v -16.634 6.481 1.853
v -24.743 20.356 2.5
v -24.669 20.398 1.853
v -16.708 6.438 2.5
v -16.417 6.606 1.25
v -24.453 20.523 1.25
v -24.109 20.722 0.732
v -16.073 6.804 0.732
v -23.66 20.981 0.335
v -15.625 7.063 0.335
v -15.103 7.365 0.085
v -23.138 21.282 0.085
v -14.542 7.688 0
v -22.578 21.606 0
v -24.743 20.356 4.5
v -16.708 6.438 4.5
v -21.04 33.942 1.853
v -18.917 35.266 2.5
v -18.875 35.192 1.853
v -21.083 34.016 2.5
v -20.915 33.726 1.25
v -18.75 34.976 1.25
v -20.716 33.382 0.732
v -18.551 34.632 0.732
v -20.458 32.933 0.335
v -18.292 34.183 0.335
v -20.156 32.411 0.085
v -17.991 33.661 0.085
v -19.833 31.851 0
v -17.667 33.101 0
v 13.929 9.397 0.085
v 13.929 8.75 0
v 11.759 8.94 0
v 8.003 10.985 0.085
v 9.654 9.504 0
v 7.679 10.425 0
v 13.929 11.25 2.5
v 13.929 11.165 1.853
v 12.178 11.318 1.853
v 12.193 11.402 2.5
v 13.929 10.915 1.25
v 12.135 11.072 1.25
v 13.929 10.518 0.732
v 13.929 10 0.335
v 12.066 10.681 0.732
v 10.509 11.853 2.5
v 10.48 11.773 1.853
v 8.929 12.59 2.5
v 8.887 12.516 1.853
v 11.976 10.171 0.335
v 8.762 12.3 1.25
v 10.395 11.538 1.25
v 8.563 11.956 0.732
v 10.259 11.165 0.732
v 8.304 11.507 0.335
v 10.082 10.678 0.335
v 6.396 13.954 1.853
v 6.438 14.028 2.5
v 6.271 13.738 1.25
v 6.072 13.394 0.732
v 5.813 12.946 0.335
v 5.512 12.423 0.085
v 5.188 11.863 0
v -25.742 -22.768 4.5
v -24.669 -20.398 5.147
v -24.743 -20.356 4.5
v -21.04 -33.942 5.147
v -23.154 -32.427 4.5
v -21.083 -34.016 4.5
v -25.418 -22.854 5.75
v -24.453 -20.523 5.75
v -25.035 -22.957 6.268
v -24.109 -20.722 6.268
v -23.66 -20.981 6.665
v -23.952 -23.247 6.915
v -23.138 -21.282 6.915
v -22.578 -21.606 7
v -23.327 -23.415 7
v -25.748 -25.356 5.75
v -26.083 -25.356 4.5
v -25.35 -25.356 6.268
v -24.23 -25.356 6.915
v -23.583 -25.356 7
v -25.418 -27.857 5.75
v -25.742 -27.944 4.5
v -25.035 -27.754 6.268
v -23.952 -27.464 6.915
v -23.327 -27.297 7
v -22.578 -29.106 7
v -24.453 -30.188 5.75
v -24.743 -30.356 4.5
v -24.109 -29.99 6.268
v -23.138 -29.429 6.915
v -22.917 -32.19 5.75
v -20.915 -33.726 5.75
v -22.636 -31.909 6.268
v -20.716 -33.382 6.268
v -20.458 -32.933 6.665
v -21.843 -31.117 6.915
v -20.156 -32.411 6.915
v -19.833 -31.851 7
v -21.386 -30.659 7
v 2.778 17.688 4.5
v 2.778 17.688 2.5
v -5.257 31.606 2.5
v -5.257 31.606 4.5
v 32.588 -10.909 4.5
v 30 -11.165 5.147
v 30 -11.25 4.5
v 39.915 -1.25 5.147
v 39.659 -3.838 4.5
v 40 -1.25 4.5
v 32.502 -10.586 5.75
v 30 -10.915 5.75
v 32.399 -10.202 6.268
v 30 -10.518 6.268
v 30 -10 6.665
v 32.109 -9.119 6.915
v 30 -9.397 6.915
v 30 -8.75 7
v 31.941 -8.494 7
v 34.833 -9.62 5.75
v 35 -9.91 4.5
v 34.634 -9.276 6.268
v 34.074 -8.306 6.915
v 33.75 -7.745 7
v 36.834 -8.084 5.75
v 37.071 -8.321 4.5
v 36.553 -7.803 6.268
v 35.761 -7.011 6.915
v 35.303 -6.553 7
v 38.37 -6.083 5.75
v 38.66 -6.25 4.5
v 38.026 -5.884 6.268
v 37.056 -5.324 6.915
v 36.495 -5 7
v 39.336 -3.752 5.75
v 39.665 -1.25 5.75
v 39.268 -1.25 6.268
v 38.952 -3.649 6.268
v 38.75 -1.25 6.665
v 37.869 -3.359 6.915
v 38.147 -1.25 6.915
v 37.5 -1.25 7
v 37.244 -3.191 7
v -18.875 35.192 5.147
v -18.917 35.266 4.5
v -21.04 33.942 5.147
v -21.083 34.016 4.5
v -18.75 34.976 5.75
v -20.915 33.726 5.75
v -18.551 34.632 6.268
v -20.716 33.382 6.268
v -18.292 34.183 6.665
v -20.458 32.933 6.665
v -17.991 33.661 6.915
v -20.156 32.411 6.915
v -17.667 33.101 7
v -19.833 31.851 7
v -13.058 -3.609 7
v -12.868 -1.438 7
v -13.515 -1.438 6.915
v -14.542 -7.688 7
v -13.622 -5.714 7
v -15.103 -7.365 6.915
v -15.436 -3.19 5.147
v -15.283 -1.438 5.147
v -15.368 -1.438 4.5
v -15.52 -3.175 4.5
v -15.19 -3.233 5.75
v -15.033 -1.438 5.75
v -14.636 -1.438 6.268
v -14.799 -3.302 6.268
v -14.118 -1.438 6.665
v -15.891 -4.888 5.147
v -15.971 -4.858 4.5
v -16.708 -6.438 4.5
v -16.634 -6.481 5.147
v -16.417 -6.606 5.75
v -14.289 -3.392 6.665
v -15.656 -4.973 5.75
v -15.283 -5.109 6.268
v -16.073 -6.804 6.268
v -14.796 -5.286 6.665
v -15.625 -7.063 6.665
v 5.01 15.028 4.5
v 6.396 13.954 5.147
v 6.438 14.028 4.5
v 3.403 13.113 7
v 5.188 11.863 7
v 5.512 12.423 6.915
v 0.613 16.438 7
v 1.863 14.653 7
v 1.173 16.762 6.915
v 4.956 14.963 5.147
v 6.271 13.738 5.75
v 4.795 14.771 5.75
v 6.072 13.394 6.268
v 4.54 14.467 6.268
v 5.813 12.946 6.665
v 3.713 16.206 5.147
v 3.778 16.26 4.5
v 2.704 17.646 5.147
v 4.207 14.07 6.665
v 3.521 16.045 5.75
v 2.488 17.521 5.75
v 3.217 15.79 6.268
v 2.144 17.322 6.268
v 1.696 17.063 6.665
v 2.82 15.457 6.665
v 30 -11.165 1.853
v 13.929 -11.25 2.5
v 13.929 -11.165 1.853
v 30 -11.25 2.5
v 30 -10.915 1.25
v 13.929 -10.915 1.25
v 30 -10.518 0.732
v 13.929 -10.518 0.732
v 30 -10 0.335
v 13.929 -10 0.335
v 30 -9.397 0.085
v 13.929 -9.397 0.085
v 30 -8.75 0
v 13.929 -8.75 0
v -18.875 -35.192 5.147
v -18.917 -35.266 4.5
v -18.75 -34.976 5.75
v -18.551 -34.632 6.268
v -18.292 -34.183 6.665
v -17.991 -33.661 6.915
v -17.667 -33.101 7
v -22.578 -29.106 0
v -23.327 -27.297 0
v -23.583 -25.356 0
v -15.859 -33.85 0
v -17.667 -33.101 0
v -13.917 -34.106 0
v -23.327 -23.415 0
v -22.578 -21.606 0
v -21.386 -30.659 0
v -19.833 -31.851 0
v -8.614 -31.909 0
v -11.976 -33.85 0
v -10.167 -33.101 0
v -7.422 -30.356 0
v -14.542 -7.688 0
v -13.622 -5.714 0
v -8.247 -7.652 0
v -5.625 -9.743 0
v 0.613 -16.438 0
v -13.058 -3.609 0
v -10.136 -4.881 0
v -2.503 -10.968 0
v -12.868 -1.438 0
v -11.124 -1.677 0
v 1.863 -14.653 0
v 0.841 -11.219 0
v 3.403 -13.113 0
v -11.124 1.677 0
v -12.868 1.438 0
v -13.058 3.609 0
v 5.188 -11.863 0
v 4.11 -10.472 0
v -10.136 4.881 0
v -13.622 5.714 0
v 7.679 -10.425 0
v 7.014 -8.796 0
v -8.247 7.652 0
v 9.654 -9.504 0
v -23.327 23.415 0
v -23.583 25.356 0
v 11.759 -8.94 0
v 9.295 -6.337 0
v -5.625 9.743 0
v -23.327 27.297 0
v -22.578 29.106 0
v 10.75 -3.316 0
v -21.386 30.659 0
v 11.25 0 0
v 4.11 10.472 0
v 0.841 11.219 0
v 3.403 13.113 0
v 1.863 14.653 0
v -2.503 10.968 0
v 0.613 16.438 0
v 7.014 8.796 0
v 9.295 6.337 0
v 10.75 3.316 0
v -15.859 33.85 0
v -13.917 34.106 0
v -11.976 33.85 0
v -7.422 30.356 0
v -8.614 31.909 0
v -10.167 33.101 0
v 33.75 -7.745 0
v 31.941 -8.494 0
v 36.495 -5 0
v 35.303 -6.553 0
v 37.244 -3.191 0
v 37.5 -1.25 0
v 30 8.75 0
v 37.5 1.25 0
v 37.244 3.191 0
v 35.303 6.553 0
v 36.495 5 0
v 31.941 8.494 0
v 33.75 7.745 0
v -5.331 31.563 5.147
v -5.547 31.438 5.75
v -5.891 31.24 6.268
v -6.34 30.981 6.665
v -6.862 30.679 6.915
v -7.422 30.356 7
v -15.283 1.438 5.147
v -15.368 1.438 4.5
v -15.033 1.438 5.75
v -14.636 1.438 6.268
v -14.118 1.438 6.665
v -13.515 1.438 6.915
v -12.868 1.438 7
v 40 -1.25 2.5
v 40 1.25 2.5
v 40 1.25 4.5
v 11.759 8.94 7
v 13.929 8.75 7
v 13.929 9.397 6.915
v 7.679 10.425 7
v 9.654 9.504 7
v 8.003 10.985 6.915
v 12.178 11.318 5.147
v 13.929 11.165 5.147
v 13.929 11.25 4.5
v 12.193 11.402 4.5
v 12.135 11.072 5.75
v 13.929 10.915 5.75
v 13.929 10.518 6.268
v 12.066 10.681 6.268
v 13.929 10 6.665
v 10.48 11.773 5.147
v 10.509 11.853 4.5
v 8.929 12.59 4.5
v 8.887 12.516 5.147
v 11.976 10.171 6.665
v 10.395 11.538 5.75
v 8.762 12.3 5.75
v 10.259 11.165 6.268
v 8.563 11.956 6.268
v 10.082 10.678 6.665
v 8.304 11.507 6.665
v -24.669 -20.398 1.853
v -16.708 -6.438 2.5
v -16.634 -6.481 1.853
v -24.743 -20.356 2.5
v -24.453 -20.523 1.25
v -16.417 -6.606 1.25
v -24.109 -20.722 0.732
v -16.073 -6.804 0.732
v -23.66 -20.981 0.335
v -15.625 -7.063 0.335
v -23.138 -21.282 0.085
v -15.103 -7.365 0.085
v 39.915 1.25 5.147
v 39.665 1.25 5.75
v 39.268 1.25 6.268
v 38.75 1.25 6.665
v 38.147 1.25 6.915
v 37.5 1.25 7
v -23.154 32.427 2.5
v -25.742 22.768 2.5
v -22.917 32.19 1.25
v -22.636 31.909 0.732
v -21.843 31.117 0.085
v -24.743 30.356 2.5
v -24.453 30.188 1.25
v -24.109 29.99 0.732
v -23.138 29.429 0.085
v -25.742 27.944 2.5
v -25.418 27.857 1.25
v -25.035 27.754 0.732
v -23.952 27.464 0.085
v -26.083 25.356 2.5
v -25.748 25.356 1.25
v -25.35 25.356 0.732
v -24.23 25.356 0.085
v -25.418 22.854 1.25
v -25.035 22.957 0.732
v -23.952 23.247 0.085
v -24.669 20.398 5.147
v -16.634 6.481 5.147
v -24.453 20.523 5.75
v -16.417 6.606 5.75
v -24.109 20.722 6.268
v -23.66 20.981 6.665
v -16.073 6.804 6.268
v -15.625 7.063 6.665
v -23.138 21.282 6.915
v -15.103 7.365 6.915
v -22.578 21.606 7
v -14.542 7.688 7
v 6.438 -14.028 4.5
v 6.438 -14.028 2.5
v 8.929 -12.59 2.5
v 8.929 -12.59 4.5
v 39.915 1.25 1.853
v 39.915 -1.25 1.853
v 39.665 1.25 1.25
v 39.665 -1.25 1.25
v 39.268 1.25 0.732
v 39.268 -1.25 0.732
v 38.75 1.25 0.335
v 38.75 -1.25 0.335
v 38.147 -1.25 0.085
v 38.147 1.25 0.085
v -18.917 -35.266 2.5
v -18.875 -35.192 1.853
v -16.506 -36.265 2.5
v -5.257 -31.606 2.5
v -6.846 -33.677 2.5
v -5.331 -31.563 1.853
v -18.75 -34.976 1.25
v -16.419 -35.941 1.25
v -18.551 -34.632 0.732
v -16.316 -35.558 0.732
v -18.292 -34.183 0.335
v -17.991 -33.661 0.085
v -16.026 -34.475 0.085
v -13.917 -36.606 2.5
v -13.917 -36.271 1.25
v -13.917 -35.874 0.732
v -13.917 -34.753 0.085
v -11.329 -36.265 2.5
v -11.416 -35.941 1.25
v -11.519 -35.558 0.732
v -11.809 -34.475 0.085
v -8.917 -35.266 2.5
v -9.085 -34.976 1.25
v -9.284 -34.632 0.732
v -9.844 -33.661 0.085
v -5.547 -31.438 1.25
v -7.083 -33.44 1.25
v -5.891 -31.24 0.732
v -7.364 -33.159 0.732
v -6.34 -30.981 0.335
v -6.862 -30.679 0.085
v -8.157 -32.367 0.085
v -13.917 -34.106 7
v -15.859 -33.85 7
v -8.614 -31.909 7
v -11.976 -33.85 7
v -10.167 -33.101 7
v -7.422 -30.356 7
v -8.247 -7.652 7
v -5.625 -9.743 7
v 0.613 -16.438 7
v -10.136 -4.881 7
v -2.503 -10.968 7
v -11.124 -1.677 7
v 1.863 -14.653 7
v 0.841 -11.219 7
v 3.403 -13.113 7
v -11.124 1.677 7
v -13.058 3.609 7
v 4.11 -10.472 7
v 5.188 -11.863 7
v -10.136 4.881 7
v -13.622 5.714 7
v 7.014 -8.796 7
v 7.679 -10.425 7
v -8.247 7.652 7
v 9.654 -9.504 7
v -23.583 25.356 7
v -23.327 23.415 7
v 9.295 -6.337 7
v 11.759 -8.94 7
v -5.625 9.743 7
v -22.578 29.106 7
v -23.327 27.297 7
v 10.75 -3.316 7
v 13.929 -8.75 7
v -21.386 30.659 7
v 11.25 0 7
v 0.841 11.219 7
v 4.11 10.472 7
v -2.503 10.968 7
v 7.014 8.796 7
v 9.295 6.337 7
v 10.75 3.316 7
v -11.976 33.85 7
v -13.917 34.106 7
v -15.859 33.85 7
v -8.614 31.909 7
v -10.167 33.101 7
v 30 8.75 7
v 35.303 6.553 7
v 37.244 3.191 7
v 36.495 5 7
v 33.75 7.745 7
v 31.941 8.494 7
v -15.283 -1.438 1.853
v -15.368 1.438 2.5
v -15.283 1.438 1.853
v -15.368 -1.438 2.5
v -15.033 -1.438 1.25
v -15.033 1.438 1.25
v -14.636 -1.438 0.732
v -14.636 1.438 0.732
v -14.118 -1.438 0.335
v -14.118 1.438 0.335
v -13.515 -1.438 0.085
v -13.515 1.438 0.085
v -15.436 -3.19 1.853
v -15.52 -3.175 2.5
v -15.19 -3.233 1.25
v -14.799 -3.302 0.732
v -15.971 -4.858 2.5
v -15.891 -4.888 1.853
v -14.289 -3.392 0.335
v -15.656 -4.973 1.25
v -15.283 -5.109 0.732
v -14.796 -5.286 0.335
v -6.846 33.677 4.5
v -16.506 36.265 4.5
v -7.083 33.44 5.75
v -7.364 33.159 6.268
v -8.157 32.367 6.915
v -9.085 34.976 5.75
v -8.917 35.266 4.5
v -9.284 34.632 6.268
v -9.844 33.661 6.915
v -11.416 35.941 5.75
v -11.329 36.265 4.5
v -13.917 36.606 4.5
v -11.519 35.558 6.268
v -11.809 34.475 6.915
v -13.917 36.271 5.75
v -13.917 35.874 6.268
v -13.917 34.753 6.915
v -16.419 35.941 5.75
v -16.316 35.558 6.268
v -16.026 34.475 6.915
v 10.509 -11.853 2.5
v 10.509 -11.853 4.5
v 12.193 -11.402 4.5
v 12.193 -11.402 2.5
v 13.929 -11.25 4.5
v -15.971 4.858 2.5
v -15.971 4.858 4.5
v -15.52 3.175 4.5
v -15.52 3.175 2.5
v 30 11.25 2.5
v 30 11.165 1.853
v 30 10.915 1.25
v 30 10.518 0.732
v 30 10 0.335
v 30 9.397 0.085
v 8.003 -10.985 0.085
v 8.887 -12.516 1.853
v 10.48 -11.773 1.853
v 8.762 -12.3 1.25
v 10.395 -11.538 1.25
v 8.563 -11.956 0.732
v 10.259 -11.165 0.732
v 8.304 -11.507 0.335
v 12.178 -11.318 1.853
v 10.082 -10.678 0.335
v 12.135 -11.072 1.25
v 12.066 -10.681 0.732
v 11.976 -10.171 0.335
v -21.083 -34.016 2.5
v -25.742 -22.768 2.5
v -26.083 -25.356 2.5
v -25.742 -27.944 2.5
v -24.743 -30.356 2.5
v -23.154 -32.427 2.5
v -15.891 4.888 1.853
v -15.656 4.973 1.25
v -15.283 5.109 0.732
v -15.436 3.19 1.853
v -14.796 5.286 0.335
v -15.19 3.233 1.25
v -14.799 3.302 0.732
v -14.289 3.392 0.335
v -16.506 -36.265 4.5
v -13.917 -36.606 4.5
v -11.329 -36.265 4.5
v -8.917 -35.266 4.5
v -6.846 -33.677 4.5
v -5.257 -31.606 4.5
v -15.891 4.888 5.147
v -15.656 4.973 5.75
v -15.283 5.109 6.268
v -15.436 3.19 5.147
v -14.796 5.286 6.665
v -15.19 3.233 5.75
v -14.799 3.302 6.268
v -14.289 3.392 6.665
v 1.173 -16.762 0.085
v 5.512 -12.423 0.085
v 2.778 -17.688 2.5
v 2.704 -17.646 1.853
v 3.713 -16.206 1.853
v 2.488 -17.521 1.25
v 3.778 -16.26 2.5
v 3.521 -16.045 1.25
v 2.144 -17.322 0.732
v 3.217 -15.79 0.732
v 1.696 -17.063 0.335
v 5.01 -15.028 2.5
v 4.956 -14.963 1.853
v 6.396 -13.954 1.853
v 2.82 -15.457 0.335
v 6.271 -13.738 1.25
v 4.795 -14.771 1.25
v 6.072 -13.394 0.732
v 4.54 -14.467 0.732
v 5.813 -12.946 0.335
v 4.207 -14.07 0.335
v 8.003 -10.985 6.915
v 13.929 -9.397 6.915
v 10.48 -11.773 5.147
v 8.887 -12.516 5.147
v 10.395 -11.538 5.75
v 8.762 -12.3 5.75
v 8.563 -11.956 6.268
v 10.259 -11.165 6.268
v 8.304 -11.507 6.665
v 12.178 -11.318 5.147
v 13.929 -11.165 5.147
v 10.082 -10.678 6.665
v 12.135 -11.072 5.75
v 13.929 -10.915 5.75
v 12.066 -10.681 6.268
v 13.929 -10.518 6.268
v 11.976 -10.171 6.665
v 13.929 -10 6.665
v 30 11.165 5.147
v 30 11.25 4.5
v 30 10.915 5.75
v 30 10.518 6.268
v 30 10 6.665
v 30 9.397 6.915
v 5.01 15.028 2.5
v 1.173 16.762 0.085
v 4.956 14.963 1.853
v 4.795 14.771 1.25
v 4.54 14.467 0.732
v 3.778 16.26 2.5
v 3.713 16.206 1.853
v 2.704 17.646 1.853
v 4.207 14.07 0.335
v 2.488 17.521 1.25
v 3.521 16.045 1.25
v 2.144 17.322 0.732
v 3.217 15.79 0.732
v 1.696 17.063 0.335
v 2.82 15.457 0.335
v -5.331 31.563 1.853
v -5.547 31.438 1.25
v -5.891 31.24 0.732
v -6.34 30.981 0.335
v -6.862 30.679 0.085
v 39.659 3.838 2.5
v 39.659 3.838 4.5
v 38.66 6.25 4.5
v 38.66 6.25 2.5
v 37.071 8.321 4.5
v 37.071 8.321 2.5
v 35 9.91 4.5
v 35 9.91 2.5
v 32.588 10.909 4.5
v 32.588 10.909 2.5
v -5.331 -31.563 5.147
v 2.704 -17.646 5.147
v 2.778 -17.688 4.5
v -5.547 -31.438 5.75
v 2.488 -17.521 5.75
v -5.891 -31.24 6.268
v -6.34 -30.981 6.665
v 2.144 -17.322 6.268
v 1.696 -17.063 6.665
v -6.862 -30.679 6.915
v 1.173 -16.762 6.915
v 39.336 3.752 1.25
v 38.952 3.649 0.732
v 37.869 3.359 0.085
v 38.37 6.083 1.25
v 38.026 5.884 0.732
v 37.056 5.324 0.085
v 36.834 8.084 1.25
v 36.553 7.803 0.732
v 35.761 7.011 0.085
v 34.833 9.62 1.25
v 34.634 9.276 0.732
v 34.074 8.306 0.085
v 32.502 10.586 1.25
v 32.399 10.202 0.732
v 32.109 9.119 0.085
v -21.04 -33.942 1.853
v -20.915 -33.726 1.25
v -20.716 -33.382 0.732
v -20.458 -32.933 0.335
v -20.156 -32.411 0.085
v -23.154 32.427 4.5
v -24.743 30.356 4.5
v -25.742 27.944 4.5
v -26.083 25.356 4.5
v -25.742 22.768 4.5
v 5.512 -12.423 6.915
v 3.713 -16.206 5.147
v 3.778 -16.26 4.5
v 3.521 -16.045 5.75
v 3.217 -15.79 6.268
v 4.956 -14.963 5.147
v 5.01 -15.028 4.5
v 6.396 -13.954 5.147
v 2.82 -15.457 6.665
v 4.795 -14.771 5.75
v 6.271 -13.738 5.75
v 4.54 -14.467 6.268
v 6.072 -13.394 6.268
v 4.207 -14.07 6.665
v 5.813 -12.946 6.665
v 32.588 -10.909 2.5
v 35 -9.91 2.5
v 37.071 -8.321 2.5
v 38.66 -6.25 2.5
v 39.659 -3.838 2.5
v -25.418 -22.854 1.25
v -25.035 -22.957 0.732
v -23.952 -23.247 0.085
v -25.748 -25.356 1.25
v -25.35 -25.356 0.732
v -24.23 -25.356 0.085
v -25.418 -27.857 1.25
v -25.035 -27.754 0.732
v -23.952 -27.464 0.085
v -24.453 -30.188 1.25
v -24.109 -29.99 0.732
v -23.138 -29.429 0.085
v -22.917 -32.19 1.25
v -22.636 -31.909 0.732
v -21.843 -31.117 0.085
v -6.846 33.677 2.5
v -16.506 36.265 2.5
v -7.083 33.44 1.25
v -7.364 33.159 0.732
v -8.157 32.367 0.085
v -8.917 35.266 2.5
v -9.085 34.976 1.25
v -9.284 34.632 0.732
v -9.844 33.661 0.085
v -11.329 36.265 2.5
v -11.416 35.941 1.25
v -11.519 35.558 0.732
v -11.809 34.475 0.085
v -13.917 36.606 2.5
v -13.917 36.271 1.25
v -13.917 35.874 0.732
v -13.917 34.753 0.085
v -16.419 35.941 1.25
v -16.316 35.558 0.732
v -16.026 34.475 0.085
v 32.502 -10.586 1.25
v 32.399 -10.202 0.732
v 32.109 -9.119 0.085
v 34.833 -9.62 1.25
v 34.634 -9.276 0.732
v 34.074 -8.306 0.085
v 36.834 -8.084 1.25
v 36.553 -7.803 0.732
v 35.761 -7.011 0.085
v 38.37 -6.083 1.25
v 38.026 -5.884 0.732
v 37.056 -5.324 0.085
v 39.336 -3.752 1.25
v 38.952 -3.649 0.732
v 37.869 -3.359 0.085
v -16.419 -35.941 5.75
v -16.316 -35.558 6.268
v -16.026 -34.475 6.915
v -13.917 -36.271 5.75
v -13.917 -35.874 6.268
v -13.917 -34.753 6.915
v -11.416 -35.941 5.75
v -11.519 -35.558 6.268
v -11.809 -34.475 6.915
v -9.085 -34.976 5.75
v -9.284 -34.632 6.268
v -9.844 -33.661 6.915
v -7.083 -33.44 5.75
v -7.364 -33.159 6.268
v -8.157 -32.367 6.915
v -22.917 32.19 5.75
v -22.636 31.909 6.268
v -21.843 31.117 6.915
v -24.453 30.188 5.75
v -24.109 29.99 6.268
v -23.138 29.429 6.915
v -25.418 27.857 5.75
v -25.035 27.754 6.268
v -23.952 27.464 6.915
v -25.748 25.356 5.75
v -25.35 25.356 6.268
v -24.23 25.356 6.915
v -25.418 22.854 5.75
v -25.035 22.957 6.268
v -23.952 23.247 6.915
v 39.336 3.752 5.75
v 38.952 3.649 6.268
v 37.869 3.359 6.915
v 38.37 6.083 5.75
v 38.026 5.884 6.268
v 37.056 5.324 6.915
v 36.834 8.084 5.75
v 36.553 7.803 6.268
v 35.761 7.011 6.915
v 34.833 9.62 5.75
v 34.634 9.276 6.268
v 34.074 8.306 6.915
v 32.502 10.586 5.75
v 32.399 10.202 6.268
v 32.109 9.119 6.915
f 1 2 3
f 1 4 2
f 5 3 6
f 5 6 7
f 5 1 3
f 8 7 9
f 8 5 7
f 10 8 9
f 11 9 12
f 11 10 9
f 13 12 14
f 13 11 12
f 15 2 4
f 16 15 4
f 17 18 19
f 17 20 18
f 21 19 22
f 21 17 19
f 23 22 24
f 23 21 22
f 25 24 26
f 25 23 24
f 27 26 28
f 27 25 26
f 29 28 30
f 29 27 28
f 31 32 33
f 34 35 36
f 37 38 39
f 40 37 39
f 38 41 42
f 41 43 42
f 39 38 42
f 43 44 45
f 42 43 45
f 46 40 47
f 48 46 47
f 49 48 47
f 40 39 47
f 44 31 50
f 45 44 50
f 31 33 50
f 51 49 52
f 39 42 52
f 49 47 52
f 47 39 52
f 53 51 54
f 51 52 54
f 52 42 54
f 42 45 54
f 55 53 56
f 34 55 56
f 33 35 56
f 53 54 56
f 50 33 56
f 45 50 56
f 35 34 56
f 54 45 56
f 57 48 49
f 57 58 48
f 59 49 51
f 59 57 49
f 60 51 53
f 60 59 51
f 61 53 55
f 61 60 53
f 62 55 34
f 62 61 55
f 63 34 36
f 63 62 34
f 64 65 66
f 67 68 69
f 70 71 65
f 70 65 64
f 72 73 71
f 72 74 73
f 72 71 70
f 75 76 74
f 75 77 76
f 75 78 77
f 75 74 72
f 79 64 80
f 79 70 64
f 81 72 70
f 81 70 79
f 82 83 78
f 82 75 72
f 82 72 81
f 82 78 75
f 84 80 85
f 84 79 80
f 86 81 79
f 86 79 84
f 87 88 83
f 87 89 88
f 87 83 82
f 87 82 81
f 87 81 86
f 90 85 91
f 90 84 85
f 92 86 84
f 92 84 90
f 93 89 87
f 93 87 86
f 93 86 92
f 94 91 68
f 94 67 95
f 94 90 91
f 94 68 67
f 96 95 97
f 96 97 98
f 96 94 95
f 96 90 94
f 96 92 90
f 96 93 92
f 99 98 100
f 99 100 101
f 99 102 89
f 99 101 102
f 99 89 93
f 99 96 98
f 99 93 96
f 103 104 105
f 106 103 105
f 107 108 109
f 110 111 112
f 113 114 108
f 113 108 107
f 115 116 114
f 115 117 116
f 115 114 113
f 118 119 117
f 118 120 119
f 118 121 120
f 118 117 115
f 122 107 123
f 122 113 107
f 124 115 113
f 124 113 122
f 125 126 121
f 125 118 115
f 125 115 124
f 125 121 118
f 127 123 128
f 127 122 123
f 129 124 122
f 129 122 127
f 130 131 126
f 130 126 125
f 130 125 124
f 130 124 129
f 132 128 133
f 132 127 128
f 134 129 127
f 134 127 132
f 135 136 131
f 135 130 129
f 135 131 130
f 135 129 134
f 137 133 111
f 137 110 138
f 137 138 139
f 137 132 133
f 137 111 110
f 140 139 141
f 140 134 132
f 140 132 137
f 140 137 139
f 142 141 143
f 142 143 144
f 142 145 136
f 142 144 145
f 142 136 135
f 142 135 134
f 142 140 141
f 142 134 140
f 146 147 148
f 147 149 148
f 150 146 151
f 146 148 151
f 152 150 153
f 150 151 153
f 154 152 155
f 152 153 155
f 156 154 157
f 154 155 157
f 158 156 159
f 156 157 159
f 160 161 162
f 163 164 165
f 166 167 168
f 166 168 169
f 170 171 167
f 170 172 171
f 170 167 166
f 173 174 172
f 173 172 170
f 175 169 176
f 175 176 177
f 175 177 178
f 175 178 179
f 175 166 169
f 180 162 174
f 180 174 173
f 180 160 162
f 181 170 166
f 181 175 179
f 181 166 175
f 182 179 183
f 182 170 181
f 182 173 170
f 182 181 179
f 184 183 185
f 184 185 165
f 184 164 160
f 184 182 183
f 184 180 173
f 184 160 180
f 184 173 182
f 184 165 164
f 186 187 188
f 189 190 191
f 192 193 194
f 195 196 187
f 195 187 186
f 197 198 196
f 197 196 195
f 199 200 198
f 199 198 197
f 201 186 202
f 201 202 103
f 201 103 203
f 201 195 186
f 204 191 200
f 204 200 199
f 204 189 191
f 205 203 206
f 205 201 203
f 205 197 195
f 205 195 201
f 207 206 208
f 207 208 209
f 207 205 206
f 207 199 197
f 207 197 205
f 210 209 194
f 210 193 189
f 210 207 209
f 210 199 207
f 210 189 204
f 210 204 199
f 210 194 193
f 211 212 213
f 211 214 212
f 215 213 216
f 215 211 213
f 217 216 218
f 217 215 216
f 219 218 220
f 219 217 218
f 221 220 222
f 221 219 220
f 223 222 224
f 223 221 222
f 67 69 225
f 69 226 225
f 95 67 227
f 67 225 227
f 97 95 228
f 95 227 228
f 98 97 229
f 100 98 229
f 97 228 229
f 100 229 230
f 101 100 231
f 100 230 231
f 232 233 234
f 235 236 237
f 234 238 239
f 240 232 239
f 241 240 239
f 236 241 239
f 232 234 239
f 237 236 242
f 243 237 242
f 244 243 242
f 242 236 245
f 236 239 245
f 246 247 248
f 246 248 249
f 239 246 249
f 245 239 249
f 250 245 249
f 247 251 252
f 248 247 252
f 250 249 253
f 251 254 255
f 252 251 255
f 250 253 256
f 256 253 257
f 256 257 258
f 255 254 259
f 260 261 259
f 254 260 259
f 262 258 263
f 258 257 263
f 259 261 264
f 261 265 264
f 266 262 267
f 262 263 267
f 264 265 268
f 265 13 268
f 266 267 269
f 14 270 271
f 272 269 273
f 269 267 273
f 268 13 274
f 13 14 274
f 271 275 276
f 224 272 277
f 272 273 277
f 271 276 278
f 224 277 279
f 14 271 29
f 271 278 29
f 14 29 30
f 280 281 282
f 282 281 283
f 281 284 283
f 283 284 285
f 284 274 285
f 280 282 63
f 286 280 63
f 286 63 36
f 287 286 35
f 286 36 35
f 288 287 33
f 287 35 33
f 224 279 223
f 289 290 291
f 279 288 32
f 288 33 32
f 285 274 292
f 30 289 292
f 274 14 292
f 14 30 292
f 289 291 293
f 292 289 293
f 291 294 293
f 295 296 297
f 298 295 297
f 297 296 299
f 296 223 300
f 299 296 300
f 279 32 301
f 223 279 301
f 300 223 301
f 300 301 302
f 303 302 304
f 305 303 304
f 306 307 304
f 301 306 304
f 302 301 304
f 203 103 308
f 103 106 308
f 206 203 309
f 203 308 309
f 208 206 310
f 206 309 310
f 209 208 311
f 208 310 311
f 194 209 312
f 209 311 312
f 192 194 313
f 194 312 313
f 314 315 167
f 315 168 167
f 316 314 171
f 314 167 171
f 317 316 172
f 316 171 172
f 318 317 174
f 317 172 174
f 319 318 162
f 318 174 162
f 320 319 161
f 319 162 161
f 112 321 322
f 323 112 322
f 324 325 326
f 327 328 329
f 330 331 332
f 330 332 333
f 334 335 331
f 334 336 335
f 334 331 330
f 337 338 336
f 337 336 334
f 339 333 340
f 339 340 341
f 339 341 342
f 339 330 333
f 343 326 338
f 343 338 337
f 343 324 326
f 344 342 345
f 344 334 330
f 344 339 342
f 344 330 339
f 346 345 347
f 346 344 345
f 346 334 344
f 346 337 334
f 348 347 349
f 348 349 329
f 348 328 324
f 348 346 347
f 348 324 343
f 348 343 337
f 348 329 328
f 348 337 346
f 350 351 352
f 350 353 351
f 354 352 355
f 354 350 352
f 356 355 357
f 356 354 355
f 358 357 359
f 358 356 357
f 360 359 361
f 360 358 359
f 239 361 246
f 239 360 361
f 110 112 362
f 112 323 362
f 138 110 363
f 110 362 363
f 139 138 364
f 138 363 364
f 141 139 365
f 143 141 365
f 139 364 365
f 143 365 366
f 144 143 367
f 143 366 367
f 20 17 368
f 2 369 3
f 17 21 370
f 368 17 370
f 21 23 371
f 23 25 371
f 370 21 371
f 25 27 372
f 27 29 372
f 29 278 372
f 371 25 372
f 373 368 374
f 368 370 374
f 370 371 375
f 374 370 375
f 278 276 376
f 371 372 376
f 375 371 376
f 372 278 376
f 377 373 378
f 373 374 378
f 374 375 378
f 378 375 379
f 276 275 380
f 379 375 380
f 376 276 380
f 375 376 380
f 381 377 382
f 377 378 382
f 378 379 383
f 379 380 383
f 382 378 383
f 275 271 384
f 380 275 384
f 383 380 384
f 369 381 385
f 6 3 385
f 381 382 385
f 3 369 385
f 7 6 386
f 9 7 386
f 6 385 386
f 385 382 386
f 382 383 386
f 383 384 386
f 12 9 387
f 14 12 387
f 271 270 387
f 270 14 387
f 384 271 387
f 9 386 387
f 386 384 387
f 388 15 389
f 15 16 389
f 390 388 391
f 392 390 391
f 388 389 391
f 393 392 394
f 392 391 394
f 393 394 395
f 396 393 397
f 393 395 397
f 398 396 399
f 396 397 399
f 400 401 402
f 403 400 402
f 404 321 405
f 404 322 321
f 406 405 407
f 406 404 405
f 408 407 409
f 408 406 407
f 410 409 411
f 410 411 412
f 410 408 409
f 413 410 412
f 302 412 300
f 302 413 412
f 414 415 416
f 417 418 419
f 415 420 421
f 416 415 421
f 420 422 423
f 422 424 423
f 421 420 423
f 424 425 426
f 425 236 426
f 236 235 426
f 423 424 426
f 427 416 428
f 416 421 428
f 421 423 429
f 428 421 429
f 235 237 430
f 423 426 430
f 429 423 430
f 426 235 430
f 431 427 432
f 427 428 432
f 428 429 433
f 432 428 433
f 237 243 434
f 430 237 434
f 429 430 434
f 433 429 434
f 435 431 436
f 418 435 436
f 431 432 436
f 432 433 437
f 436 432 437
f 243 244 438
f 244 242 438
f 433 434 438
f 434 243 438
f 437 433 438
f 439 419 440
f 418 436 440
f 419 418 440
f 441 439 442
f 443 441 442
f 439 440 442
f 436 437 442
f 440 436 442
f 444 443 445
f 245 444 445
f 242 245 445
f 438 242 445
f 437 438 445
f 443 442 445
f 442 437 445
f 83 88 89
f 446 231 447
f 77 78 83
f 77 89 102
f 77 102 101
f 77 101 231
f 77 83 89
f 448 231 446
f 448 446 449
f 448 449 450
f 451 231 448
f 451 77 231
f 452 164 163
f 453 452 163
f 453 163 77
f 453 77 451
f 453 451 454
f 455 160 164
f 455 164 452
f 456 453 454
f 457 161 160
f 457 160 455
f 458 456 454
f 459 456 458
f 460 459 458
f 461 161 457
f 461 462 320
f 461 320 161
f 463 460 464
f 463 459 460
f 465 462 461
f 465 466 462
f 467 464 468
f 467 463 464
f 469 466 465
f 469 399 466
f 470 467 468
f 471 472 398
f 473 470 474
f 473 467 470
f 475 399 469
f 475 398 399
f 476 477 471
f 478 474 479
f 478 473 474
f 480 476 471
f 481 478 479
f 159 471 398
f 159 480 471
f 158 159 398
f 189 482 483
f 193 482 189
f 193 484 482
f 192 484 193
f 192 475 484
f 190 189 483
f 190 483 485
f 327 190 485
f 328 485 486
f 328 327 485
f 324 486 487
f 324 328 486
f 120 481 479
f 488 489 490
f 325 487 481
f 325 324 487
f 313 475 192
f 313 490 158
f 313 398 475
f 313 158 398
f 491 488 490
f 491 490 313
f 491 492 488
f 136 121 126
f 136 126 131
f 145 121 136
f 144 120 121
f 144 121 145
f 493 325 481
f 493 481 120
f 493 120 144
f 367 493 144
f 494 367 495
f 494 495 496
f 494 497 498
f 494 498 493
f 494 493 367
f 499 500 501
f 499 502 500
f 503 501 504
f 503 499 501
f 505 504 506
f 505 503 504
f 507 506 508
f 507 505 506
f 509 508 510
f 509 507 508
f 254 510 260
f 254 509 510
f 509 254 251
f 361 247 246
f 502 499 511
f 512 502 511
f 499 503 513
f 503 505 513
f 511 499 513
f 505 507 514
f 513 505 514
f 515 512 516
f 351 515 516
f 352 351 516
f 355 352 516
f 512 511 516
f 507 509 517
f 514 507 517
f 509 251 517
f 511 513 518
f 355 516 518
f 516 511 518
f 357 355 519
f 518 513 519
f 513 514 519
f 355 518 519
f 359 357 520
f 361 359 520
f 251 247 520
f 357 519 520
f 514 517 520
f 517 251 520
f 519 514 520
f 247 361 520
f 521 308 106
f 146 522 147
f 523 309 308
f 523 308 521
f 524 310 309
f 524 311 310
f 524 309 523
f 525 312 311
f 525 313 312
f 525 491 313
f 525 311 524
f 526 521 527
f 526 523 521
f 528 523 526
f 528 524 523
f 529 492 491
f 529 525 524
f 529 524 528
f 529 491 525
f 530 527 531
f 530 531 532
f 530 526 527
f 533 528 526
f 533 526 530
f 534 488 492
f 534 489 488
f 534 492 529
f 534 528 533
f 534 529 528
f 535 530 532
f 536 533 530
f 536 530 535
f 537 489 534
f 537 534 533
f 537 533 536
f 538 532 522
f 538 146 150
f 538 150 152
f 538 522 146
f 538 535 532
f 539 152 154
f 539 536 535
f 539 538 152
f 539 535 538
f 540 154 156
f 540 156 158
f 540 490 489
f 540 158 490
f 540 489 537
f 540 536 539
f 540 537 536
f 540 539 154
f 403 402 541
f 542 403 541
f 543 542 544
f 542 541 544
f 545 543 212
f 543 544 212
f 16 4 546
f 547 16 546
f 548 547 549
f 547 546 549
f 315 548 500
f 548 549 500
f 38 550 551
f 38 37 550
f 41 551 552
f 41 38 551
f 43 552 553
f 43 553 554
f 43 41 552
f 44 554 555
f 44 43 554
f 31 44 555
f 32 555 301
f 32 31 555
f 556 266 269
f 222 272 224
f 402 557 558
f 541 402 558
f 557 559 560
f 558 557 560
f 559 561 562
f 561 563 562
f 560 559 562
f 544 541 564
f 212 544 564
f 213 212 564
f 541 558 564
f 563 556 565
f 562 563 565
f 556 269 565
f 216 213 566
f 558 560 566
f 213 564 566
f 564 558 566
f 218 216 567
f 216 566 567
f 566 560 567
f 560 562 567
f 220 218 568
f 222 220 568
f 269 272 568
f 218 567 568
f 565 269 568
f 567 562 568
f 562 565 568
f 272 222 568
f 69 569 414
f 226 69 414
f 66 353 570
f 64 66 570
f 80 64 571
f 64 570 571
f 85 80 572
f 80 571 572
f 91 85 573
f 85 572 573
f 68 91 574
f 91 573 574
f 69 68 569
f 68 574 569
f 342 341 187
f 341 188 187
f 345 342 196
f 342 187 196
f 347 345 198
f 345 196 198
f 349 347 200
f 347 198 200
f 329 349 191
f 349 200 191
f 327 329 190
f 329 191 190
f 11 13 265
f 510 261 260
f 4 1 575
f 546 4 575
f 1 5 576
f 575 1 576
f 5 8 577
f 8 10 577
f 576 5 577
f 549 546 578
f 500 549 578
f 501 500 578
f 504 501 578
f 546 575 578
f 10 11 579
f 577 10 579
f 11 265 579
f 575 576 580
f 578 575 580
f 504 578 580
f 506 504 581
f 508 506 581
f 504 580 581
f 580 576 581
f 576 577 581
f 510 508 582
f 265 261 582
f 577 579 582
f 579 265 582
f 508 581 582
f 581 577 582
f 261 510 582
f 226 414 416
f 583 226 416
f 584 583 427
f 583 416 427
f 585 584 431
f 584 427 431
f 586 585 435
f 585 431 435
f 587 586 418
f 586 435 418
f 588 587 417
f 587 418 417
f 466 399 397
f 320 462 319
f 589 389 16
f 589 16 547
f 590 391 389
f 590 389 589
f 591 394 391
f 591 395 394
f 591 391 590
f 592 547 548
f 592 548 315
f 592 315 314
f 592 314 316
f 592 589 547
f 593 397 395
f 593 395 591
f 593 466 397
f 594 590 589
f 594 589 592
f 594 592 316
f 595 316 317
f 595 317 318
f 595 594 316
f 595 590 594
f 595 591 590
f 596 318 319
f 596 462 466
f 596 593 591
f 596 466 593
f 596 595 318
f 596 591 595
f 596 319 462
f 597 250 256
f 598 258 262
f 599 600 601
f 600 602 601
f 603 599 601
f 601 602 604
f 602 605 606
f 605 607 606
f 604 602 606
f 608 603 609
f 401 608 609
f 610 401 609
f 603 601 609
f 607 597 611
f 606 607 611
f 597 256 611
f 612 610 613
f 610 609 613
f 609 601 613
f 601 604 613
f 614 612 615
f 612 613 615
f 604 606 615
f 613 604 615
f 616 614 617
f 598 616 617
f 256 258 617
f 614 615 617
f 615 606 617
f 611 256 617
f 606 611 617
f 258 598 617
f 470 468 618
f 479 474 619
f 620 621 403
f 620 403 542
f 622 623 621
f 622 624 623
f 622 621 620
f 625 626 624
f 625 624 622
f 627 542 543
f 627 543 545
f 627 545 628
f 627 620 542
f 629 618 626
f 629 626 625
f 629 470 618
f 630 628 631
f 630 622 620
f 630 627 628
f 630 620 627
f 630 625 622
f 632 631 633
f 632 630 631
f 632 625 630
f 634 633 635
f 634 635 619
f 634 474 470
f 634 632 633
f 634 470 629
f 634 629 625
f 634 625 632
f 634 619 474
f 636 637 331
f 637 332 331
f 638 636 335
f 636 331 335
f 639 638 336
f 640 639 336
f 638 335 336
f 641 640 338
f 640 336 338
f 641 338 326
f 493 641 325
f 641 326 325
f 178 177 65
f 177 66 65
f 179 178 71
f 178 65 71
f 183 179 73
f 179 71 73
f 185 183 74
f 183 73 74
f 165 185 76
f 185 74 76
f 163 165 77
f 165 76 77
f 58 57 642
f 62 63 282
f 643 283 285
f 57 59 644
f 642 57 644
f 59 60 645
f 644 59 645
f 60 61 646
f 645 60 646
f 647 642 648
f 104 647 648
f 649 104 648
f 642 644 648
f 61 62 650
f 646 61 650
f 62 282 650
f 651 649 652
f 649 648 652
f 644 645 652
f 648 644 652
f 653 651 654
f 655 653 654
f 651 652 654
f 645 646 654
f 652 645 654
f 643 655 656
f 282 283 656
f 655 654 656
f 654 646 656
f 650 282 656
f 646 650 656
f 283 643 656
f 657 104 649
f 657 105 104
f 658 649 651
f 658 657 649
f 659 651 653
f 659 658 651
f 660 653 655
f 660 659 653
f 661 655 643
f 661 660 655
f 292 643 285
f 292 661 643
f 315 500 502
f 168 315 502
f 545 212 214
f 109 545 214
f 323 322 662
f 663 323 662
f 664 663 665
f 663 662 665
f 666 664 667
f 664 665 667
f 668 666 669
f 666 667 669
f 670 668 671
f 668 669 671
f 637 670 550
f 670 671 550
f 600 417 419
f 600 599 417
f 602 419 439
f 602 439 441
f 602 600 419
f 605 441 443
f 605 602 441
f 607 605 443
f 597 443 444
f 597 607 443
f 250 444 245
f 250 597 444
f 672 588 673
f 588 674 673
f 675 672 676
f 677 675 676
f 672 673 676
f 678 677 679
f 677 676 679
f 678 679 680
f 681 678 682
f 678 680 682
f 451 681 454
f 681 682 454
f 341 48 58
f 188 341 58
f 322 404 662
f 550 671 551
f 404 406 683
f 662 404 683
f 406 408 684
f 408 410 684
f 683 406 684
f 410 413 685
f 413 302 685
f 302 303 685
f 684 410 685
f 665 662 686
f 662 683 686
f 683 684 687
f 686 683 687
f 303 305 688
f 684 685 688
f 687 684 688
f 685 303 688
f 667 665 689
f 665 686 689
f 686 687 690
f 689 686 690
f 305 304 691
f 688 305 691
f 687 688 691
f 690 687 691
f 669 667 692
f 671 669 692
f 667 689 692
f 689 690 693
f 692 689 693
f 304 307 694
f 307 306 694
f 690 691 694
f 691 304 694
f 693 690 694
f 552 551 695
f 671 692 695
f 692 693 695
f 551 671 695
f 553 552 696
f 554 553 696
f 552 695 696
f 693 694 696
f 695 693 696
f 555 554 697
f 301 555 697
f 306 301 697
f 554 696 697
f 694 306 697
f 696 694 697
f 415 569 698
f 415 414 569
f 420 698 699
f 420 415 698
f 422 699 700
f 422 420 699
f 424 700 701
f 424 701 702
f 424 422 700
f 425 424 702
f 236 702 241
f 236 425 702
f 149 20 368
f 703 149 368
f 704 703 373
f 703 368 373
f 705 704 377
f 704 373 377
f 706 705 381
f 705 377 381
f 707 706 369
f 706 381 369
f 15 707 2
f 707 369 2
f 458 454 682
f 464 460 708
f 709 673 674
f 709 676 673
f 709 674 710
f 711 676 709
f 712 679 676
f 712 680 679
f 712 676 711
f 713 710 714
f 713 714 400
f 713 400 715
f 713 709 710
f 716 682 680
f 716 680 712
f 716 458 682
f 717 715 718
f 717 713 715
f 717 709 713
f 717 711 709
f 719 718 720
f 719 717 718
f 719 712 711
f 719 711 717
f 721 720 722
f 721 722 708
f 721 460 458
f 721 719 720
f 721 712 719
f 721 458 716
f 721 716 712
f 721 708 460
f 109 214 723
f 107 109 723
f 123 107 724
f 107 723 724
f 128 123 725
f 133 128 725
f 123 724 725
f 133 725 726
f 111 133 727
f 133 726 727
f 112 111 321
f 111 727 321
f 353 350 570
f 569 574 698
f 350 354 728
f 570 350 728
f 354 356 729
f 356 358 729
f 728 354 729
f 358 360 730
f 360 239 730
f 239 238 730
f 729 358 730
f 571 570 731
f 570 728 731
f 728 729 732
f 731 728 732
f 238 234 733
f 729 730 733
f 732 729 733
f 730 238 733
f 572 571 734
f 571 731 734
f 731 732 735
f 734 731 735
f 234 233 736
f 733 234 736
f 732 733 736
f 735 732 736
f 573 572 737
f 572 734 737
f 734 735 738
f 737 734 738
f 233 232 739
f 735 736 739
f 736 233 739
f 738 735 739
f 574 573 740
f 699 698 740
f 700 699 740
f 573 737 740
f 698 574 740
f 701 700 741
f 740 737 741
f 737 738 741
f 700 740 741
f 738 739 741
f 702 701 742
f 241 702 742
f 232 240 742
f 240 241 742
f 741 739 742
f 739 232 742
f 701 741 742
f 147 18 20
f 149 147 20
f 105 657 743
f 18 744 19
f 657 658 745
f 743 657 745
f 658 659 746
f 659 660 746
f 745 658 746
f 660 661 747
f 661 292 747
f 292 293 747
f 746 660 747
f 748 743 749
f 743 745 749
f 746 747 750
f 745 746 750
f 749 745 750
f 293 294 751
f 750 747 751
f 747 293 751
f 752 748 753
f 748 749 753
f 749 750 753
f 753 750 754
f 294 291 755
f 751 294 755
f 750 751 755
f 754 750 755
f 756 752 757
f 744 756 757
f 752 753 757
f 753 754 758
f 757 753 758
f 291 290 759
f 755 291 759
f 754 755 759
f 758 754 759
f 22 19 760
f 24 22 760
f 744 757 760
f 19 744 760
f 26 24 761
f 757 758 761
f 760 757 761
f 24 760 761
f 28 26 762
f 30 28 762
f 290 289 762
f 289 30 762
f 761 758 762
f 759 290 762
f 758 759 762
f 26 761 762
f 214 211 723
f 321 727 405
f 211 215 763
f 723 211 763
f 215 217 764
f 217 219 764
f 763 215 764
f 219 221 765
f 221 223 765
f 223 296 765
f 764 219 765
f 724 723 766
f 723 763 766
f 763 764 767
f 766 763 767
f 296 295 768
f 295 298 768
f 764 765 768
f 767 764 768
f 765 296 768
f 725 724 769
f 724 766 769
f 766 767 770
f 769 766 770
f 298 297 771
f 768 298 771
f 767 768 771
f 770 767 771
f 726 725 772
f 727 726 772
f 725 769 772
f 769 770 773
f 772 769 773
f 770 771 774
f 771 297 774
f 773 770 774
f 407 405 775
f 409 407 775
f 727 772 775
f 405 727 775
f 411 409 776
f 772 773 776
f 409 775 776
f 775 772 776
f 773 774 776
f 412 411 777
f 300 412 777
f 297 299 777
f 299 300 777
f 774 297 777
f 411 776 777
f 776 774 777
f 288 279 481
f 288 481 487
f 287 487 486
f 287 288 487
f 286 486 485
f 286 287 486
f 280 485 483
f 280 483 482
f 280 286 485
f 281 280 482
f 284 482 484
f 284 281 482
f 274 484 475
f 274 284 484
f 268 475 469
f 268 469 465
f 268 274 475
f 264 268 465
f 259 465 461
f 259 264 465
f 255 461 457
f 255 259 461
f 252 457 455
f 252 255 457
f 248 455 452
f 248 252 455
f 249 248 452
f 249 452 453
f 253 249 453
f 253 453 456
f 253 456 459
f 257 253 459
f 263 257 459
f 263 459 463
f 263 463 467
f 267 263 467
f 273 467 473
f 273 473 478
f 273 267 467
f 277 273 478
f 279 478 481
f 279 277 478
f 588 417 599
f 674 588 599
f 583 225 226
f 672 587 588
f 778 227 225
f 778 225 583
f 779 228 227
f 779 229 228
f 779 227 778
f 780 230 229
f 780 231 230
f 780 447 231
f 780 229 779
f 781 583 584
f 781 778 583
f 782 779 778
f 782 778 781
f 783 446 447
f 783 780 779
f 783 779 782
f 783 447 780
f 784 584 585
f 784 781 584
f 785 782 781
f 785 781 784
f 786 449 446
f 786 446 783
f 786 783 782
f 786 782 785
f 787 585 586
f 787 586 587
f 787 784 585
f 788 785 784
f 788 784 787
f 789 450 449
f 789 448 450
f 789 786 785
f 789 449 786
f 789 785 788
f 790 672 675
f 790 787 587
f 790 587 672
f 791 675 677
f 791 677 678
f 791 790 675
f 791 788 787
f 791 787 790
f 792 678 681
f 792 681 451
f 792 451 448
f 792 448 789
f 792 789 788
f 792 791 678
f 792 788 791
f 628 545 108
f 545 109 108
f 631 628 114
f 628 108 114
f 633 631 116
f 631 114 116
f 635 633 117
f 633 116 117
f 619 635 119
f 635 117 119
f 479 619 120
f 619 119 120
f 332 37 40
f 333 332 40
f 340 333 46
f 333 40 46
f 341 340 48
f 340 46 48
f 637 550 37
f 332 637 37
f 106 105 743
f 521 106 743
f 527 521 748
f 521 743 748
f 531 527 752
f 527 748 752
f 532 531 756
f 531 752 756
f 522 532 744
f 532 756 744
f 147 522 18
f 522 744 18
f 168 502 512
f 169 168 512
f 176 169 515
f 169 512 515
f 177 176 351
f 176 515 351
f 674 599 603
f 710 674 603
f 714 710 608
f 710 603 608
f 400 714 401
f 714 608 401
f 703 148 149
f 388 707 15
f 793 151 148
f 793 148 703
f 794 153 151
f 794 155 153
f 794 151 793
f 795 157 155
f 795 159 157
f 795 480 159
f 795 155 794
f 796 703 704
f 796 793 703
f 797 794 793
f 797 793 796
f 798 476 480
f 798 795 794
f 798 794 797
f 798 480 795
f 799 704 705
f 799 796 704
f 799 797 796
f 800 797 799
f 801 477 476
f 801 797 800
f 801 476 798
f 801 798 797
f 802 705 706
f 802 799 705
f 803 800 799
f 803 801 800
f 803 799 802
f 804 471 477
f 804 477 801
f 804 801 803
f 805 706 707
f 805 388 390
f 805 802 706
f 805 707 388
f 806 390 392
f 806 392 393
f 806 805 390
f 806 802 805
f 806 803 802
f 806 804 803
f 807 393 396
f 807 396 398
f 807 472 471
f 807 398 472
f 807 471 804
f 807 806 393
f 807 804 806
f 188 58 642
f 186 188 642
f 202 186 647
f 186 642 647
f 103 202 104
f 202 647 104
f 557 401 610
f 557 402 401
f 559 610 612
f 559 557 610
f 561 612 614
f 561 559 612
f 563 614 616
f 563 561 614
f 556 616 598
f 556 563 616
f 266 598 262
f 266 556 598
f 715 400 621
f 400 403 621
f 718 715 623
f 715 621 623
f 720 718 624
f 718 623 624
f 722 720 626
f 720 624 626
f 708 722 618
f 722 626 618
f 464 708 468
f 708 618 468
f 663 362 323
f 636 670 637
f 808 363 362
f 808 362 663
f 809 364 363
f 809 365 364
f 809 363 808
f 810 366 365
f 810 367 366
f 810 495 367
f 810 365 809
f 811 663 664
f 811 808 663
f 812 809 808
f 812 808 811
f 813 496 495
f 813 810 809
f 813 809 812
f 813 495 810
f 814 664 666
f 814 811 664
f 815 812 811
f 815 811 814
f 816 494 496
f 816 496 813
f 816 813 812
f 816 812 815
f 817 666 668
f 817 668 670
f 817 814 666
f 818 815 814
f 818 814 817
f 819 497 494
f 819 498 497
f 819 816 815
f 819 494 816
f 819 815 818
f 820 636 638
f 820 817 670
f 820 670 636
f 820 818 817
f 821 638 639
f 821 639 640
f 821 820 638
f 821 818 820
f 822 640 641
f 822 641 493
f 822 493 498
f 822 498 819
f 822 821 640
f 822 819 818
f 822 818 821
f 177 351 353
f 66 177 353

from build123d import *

# Parameters (mm, degrees)
F0_R     = 11.25
F1_DEPTH = 7
F2_R     = 2.5


with BuildPart() as f1:
    # F0 (on Top) → F1 (new body)
    with BuildSketch(Plane.XY):
        with BuildLine():
            ThreePointArc((8.929492, -12.589746), (11.341301, -11.590742), (13.929492, -11.25))
            Line((13.929492, -11.25), (30, -11.25))
            ThreePointArc((30, -11.25), (37.071068, -8.321068), (40, -1.25))
            Line((40, -1.25), (40, 1.25))
            ThreePointArc((40, 1.25), (37.071068, 8.321068), (30, 11.25))
            Line((30, 11.25), (13.929492, 11.25))
            ThreePointArc((13.929492, 11.25), (11.341301, 11.590742), (8.929492, 12.589746))
            Line((8.929492, 12.589746), (6.438294, 14.02804))
            ThreePointArc((6.438294, 14.02804), (4.367226, 15.617226), (2.77804, 17.688294))
            Line((2.77804, 17.688294), (-5.257214, 31.605762))
            ThreePointArc((-5.257214, 31.605762), (-11.329278, 36.26502), (-18.917468, 35.266016))
            Line((-18.917468, 35.266016), (-21.082532, 34.016016))
            ThreePointArc((-21.082532, 34.016016), (-25.74179, 27.943953), (-24.742786, 20.355762))
            Line((-24.742786, 20.355762), (-16.707532, 6.438294))
            ThreePointArc((-16.707532, 6.438294), (-15.708528, 4.026484), (-15.367786, 1.438294))
            Line((-15.367786, 1.438294), (-15.367786, -1.438294))
            ThreePointArc((-15.367786, -1.438294), (-15.708528, -4.026484), (-16.707532, -6.438294))
            Line((-16.707532, -6.438294), (-24.742786, -20.355762))
            ThreePointArc((-24.742786, -20.355762), (-25.74179, -27.943953), (-21.082532, -34.016016))
            Line((-21.082532, -34.016016), (-18.917468, -35.266016))
            ThreePointArc((-18.917468, -35.266016), (-11.329278, -36.26502), (-5.257214, -31.605762))
            Line((-5.257214, -31.605762), (2.77804, -17.688294))
            ThreePointArc((2.77804, -17.688294), (4.367226, -15.617226), (6.438294, -14.02804))
            Line((6.438294, -14.02804), (8.929492, -12.589746))
        make_face()
        Circle(F0_R, mode=Mode.SUBTRACT)
    extrude(amount=F1_DEPTH)

    # F2
    f2_edges = [f1.edges().sort_by_distance(p)[0] for p in [
        (-1.239587, -24.647028, 7),
        (21.964746, 11.25, 0),
    ]]
    fillet(f2_edges, radius=F2_R)


solid = f1.part
